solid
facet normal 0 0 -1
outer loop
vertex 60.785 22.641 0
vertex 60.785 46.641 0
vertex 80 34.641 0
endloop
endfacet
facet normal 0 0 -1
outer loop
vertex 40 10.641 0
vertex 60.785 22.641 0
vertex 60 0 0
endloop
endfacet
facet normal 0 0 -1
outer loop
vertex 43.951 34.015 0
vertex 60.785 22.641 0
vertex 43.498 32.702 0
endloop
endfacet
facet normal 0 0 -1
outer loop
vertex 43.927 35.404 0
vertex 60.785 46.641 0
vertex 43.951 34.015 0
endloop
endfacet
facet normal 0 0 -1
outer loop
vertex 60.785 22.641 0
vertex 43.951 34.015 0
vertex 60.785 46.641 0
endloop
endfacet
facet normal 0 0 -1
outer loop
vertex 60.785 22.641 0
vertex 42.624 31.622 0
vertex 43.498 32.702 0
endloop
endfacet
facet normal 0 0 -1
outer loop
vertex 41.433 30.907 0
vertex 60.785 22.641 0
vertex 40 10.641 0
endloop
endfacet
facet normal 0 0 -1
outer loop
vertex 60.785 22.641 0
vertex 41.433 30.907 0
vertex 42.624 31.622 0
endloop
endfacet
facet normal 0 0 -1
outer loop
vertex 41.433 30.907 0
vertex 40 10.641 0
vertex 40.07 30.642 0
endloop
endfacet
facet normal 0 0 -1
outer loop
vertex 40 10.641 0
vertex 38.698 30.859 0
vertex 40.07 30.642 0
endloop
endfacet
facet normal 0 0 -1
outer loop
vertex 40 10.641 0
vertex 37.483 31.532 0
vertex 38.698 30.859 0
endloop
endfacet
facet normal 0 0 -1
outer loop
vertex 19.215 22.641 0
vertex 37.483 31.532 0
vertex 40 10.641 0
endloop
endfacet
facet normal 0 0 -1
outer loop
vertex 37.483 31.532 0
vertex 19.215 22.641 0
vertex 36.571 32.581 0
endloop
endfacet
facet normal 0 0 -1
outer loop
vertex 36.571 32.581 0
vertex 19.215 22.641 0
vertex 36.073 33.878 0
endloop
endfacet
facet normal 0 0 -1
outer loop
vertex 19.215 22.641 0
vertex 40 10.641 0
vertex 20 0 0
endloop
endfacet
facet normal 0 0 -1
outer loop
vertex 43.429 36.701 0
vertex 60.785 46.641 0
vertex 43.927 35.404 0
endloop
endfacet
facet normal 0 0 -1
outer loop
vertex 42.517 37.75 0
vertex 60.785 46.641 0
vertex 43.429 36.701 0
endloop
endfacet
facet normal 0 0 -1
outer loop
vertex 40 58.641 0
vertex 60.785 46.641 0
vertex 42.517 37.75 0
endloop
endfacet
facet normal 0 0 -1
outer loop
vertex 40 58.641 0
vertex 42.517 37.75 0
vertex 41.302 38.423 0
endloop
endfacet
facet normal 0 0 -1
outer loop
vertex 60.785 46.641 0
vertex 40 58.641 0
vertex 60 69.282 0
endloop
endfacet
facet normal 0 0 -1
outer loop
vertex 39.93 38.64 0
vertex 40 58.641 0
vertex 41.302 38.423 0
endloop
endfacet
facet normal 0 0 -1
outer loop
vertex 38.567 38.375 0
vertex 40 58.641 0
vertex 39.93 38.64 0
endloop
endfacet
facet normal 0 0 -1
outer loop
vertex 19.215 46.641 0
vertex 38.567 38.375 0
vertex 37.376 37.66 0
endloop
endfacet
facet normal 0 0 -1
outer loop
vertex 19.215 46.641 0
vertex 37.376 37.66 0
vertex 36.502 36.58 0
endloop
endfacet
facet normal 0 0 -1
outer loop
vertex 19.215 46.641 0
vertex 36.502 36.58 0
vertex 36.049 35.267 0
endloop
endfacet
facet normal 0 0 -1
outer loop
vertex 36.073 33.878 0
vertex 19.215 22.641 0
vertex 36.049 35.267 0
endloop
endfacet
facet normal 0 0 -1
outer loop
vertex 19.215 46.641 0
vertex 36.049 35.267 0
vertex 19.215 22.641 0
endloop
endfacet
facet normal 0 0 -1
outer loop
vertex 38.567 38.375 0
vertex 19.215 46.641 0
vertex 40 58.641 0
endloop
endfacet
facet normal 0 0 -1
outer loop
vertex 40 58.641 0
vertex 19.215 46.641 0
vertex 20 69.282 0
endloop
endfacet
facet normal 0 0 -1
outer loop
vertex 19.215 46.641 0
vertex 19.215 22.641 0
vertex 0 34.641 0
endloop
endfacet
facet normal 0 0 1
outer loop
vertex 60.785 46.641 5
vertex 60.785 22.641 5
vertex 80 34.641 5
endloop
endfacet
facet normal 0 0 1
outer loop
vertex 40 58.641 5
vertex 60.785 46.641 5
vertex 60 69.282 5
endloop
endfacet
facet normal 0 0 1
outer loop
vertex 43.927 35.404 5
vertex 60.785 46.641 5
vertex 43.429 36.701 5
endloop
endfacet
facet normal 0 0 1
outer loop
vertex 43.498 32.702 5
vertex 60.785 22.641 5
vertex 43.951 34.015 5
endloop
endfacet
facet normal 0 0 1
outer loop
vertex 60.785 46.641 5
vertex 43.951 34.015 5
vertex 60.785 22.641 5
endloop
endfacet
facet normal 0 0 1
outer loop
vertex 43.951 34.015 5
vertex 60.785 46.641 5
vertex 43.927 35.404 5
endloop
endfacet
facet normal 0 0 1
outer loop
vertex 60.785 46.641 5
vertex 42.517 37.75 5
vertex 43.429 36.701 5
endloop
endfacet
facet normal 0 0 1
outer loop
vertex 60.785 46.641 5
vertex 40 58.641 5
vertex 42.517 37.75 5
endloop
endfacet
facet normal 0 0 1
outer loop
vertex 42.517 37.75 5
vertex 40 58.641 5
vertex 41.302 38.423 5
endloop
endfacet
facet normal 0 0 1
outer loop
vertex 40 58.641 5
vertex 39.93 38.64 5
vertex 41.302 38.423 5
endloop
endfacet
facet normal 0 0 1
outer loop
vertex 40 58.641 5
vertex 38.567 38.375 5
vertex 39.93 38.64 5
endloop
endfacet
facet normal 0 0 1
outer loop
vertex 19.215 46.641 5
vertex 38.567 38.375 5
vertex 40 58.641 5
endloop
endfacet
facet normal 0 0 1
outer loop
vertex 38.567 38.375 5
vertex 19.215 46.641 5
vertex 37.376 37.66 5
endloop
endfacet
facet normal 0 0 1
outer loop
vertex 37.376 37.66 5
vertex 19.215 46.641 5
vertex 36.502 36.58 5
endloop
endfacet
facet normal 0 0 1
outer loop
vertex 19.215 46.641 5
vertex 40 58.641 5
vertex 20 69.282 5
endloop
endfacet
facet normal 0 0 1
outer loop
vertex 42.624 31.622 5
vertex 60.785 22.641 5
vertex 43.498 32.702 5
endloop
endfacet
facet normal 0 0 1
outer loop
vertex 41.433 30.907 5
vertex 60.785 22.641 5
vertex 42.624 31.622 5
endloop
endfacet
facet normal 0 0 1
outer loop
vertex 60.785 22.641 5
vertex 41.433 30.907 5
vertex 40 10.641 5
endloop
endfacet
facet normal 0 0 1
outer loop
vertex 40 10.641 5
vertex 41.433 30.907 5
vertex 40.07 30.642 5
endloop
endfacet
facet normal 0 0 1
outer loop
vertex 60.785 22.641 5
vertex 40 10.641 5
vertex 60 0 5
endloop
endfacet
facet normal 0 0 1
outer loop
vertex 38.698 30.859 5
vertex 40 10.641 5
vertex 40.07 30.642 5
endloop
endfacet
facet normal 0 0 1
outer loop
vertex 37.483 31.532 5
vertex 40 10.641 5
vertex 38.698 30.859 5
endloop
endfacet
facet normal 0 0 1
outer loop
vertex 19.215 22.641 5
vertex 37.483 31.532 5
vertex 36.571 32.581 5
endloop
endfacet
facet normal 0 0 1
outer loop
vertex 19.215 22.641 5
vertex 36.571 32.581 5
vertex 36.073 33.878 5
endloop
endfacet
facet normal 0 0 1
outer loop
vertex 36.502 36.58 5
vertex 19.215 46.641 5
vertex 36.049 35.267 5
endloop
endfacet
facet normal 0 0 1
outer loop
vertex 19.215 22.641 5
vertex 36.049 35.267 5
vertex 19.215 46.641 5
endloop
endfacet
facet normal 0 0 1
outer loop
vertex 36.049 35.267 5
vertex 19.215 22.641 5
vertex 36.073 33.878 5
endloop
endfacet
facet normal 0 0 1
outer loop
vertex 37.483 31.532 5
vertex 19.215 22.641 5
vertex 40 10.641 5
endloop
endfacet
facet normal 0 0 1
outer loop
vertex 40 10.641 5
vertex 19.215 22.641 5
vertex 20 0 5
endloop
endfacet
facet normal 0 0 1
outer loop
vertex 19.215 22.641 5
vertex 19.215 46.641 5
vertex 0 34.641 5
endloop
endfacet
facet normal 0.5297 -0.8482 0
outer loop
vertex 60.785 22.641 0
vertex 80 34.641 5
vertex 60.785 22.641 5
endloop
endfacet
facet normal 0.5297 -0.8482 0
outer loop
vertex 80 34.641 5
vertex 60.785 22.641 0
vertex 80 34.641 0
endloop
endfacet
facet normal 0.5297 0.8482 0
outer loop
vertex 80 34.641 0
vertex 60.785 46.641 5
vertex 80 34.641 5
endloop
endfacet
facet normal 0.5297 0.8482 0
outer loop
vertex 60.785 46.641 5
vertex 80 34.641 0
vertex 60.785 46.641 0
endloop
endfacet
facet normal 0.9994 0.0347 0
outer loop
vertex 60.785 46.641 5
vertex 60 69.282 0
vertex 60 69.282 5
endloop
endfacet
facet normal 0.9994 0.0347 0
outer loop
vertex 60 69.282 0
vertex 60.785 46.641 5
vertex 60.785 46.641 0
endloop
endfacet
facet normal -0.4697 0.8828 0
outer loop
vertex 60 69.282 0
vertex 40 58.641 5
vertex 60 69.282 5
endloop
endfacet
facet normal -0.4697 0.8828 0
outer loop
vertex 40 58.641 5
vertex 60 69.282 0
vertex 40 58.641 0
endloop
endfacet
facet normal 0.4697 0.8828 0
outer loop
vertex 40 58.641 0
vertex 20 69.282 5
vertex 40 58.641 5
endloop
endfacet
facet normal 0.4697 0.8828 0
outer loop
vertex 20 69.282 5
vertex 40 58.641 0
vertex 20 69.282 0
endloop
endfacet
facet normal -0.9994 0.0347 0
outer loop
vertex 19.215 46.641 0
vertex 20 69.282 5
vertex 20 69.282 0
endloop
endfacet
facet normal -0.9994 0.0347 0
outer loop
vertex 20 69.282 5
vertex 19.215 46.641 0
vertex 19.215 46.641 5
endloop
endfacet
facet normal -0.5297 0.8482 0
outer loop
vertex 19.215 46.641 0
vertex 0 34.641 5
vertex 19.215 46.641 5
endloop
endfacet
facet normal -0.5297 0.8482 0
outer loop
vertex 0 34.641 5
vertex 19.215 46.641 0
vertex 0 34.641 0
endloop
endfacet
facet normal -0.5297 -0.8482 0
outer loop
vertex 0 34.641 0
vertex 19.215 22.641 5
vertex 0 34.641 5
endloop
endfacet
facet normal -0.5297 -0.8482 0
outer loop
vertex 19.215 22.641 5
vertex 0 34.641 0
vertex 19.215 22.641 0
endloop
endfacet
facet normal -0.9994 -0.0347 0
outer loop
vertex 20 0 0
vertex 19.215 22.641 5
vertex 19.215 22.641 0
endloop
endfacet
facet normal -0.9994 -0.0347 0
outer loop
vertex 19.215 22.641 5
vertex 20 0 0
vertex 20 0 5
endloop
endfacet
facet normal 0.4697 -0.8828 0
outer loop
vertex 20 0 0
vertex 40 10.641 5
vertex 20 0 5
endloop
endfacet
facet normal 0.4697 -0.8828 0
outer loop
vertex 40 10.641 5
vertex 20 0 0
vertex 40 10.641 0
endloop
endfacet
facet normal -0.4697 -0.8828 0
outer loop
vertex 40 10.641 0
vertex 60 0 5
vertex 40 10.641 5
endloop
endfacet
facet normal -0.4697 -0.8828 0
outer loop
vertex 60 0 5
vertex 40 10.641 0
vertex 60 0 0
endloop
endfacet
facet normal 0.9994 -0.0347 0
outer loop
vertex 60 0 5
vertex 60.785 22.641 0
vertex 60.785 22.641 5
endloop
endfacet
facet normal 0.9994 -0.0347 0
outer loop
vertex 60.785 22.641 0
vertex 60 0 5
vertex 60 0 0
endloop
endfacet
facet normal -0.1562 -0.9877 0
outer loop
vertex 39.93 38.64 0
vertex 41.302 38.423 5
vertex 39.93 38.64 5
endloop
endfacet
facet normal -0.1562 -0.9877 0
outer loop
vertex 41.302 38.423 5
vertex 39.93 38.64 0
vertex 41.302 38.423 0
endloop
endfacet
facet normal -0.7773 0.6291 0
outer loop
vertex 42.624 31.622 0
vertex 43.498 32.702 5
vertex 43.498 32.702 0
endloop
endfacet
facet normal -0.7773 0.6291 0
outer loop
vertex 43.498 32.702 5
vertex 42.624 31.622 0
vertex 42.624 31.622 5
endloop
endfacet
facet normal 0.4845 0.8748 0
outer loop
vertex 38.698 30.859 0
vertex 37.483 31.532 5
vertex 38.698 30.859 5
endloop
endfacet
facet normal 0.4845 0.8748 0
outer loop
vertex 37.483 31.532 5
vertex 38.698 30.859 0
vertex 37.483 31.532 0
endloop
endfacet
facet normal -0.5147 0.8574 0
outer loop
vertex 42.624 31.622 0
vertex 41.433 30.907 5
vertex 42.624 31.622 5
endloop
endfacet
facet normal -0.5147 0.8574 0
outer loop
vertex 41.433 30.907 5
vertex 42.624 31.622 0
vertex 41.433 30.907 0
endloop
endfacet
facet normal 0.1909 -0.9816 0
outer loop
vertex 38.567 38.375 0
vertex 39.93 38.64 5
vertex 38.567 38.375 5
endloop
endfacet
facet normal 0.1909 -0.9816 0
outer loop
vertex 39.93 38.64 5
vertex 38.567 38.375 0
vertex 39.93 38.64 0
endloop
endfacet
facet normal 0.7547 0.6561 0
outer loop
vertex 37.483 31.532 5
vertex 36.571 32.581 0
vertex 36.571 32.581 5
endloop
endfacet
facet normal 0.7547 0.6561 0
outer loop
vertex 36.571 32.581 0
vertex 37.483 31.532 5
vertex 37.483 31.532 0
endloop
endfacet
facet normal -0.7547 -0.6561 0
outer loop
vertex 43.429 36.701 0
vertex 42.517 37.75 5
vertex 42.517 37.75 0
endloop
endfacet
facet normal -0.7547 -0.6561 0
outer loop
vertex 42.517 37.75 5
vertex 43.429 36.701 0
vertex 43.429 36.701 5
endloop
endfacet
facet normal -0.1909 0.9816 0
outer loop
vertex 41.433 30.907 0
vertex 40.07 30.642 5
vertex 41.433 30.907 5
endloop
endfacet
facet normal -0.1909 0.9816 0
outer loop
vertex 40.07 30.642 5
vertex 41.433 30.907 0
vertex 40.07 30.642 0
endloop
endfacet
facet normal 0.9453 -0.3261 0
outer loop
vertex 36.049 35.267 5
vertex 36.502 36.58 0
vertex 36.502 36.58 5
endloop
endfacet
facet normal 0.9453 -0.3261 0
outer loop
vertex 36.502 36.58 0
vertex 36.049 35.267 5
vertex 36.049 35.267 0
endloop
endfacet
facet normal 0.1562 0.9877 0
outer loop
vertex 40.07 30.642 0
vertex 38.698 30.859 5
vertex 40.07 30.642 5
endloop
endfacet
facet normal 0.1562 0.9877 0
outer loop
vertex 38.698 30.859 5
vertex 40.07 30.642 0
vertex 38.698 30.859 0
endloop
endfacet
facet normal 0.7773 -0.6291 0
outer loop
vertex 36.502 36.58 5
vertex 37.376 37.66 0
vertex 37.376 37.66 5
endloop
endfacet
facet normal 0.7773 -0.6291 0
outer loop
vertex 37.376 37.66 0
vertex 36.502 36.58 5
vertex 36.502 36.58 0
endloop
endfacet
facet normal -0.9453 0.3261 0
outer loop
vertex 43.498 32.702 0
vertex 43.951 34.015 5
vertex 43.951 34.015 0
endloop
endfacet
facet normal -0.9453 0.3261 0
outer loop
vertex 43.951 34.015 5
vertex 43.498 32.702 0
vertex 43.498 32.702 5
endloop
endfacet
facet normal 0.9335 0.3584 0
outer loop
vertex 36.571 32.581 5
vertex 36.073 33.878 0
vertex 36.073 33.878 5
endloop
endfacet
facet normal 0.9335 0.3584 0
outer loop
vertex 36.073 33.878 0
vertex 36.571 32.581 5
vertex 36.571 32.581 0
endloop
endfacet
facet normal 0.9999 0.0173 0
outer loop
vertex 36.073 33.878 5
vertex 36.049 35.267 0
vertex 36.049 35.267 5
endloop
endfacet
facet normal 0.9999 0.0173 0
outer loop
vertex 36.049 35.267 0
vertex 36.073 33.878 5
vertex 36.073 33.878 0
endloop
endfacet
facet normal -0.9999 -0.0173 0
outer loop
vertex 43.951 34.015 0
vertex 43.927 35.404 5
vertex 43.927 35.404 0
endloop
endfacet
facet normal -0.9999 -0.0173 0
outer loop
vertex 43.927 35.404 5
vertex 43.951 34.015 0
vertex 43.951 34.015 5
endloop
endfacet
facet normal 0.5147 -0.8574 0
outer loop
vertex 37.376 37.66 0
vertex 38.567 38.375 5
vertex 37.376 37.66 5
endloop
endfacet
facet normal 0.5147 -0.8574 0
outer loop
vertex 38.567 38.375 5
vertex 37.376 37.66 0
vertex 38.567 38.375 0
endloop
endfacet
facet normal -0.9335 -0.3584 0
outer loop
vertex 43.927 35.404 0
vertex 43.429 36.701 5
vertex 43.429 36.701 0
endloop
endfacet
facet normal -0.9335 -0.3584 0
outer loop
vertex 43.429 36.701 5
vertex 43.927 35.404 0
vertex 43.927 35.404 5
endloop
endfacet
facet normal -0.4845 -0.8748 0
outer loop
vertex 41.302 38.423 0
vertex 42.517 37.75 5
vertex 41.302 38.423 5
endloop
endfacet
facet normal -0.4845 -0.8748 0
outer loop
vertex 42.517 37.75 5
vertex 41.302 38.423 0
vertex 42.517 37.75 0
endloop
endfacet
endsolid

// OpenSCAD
$fn = 32;

// ----------------------------------------------------------------------
// Star wheel: 6-point star, R40
// ----------------------------------------------------------------------

// --- parameters (mm) ---
n_points = 6;             // number of points / teeth
r_out = 40;               // tip radius
r_in = 24;                // root radius
bore_r = 4;               // centre bore radius
plate_t = 5;              // plate thickness, Z (extrusion height)
bore_d = 8;               // centre bore diameter
fit_tol = 0.1;            // declared fit tolerance (prompt contract)
free_tol = 0.3;           // declared free tolerance (prompt contract)

profile = [[0, 34.641], [19.215, 22.641], [20, 0], [40, 10.641], [60, 0], [60.785, 22.641], [80, 34.641], [60.785, 46.641], [60, 69.282], [40, 58.641], [20, 69.282], [19.215, 46.641]];  // primary outline, 12 points, counter clockwise
void_1 = [[43.927, 35.404], [43.429, 36.701], [42.517, 37.75], [41.302, 38.423], [39.93, 38.64], [38.567, 38.375], [37.376, 37.66], [36.502, 36.58], [36.049, 35.267], [36.073, 33.878], [36.571, 32.581], [37.483, 31.532], [38.698, 30.859], [40.07, 30.642], [41.433, 30.907], [42.624, 31.622], [43.498, 32.702], [43.951, 34.015]];  // centre bore, 18 points

// --- the one profile operation ---
difference() {
  linear_extrude(height = plate_t) polygon(points = profile);
  translate([0, 0, -1])
    linear_extrude(height = plate_t + 2) polygon(points = void_1);
}
